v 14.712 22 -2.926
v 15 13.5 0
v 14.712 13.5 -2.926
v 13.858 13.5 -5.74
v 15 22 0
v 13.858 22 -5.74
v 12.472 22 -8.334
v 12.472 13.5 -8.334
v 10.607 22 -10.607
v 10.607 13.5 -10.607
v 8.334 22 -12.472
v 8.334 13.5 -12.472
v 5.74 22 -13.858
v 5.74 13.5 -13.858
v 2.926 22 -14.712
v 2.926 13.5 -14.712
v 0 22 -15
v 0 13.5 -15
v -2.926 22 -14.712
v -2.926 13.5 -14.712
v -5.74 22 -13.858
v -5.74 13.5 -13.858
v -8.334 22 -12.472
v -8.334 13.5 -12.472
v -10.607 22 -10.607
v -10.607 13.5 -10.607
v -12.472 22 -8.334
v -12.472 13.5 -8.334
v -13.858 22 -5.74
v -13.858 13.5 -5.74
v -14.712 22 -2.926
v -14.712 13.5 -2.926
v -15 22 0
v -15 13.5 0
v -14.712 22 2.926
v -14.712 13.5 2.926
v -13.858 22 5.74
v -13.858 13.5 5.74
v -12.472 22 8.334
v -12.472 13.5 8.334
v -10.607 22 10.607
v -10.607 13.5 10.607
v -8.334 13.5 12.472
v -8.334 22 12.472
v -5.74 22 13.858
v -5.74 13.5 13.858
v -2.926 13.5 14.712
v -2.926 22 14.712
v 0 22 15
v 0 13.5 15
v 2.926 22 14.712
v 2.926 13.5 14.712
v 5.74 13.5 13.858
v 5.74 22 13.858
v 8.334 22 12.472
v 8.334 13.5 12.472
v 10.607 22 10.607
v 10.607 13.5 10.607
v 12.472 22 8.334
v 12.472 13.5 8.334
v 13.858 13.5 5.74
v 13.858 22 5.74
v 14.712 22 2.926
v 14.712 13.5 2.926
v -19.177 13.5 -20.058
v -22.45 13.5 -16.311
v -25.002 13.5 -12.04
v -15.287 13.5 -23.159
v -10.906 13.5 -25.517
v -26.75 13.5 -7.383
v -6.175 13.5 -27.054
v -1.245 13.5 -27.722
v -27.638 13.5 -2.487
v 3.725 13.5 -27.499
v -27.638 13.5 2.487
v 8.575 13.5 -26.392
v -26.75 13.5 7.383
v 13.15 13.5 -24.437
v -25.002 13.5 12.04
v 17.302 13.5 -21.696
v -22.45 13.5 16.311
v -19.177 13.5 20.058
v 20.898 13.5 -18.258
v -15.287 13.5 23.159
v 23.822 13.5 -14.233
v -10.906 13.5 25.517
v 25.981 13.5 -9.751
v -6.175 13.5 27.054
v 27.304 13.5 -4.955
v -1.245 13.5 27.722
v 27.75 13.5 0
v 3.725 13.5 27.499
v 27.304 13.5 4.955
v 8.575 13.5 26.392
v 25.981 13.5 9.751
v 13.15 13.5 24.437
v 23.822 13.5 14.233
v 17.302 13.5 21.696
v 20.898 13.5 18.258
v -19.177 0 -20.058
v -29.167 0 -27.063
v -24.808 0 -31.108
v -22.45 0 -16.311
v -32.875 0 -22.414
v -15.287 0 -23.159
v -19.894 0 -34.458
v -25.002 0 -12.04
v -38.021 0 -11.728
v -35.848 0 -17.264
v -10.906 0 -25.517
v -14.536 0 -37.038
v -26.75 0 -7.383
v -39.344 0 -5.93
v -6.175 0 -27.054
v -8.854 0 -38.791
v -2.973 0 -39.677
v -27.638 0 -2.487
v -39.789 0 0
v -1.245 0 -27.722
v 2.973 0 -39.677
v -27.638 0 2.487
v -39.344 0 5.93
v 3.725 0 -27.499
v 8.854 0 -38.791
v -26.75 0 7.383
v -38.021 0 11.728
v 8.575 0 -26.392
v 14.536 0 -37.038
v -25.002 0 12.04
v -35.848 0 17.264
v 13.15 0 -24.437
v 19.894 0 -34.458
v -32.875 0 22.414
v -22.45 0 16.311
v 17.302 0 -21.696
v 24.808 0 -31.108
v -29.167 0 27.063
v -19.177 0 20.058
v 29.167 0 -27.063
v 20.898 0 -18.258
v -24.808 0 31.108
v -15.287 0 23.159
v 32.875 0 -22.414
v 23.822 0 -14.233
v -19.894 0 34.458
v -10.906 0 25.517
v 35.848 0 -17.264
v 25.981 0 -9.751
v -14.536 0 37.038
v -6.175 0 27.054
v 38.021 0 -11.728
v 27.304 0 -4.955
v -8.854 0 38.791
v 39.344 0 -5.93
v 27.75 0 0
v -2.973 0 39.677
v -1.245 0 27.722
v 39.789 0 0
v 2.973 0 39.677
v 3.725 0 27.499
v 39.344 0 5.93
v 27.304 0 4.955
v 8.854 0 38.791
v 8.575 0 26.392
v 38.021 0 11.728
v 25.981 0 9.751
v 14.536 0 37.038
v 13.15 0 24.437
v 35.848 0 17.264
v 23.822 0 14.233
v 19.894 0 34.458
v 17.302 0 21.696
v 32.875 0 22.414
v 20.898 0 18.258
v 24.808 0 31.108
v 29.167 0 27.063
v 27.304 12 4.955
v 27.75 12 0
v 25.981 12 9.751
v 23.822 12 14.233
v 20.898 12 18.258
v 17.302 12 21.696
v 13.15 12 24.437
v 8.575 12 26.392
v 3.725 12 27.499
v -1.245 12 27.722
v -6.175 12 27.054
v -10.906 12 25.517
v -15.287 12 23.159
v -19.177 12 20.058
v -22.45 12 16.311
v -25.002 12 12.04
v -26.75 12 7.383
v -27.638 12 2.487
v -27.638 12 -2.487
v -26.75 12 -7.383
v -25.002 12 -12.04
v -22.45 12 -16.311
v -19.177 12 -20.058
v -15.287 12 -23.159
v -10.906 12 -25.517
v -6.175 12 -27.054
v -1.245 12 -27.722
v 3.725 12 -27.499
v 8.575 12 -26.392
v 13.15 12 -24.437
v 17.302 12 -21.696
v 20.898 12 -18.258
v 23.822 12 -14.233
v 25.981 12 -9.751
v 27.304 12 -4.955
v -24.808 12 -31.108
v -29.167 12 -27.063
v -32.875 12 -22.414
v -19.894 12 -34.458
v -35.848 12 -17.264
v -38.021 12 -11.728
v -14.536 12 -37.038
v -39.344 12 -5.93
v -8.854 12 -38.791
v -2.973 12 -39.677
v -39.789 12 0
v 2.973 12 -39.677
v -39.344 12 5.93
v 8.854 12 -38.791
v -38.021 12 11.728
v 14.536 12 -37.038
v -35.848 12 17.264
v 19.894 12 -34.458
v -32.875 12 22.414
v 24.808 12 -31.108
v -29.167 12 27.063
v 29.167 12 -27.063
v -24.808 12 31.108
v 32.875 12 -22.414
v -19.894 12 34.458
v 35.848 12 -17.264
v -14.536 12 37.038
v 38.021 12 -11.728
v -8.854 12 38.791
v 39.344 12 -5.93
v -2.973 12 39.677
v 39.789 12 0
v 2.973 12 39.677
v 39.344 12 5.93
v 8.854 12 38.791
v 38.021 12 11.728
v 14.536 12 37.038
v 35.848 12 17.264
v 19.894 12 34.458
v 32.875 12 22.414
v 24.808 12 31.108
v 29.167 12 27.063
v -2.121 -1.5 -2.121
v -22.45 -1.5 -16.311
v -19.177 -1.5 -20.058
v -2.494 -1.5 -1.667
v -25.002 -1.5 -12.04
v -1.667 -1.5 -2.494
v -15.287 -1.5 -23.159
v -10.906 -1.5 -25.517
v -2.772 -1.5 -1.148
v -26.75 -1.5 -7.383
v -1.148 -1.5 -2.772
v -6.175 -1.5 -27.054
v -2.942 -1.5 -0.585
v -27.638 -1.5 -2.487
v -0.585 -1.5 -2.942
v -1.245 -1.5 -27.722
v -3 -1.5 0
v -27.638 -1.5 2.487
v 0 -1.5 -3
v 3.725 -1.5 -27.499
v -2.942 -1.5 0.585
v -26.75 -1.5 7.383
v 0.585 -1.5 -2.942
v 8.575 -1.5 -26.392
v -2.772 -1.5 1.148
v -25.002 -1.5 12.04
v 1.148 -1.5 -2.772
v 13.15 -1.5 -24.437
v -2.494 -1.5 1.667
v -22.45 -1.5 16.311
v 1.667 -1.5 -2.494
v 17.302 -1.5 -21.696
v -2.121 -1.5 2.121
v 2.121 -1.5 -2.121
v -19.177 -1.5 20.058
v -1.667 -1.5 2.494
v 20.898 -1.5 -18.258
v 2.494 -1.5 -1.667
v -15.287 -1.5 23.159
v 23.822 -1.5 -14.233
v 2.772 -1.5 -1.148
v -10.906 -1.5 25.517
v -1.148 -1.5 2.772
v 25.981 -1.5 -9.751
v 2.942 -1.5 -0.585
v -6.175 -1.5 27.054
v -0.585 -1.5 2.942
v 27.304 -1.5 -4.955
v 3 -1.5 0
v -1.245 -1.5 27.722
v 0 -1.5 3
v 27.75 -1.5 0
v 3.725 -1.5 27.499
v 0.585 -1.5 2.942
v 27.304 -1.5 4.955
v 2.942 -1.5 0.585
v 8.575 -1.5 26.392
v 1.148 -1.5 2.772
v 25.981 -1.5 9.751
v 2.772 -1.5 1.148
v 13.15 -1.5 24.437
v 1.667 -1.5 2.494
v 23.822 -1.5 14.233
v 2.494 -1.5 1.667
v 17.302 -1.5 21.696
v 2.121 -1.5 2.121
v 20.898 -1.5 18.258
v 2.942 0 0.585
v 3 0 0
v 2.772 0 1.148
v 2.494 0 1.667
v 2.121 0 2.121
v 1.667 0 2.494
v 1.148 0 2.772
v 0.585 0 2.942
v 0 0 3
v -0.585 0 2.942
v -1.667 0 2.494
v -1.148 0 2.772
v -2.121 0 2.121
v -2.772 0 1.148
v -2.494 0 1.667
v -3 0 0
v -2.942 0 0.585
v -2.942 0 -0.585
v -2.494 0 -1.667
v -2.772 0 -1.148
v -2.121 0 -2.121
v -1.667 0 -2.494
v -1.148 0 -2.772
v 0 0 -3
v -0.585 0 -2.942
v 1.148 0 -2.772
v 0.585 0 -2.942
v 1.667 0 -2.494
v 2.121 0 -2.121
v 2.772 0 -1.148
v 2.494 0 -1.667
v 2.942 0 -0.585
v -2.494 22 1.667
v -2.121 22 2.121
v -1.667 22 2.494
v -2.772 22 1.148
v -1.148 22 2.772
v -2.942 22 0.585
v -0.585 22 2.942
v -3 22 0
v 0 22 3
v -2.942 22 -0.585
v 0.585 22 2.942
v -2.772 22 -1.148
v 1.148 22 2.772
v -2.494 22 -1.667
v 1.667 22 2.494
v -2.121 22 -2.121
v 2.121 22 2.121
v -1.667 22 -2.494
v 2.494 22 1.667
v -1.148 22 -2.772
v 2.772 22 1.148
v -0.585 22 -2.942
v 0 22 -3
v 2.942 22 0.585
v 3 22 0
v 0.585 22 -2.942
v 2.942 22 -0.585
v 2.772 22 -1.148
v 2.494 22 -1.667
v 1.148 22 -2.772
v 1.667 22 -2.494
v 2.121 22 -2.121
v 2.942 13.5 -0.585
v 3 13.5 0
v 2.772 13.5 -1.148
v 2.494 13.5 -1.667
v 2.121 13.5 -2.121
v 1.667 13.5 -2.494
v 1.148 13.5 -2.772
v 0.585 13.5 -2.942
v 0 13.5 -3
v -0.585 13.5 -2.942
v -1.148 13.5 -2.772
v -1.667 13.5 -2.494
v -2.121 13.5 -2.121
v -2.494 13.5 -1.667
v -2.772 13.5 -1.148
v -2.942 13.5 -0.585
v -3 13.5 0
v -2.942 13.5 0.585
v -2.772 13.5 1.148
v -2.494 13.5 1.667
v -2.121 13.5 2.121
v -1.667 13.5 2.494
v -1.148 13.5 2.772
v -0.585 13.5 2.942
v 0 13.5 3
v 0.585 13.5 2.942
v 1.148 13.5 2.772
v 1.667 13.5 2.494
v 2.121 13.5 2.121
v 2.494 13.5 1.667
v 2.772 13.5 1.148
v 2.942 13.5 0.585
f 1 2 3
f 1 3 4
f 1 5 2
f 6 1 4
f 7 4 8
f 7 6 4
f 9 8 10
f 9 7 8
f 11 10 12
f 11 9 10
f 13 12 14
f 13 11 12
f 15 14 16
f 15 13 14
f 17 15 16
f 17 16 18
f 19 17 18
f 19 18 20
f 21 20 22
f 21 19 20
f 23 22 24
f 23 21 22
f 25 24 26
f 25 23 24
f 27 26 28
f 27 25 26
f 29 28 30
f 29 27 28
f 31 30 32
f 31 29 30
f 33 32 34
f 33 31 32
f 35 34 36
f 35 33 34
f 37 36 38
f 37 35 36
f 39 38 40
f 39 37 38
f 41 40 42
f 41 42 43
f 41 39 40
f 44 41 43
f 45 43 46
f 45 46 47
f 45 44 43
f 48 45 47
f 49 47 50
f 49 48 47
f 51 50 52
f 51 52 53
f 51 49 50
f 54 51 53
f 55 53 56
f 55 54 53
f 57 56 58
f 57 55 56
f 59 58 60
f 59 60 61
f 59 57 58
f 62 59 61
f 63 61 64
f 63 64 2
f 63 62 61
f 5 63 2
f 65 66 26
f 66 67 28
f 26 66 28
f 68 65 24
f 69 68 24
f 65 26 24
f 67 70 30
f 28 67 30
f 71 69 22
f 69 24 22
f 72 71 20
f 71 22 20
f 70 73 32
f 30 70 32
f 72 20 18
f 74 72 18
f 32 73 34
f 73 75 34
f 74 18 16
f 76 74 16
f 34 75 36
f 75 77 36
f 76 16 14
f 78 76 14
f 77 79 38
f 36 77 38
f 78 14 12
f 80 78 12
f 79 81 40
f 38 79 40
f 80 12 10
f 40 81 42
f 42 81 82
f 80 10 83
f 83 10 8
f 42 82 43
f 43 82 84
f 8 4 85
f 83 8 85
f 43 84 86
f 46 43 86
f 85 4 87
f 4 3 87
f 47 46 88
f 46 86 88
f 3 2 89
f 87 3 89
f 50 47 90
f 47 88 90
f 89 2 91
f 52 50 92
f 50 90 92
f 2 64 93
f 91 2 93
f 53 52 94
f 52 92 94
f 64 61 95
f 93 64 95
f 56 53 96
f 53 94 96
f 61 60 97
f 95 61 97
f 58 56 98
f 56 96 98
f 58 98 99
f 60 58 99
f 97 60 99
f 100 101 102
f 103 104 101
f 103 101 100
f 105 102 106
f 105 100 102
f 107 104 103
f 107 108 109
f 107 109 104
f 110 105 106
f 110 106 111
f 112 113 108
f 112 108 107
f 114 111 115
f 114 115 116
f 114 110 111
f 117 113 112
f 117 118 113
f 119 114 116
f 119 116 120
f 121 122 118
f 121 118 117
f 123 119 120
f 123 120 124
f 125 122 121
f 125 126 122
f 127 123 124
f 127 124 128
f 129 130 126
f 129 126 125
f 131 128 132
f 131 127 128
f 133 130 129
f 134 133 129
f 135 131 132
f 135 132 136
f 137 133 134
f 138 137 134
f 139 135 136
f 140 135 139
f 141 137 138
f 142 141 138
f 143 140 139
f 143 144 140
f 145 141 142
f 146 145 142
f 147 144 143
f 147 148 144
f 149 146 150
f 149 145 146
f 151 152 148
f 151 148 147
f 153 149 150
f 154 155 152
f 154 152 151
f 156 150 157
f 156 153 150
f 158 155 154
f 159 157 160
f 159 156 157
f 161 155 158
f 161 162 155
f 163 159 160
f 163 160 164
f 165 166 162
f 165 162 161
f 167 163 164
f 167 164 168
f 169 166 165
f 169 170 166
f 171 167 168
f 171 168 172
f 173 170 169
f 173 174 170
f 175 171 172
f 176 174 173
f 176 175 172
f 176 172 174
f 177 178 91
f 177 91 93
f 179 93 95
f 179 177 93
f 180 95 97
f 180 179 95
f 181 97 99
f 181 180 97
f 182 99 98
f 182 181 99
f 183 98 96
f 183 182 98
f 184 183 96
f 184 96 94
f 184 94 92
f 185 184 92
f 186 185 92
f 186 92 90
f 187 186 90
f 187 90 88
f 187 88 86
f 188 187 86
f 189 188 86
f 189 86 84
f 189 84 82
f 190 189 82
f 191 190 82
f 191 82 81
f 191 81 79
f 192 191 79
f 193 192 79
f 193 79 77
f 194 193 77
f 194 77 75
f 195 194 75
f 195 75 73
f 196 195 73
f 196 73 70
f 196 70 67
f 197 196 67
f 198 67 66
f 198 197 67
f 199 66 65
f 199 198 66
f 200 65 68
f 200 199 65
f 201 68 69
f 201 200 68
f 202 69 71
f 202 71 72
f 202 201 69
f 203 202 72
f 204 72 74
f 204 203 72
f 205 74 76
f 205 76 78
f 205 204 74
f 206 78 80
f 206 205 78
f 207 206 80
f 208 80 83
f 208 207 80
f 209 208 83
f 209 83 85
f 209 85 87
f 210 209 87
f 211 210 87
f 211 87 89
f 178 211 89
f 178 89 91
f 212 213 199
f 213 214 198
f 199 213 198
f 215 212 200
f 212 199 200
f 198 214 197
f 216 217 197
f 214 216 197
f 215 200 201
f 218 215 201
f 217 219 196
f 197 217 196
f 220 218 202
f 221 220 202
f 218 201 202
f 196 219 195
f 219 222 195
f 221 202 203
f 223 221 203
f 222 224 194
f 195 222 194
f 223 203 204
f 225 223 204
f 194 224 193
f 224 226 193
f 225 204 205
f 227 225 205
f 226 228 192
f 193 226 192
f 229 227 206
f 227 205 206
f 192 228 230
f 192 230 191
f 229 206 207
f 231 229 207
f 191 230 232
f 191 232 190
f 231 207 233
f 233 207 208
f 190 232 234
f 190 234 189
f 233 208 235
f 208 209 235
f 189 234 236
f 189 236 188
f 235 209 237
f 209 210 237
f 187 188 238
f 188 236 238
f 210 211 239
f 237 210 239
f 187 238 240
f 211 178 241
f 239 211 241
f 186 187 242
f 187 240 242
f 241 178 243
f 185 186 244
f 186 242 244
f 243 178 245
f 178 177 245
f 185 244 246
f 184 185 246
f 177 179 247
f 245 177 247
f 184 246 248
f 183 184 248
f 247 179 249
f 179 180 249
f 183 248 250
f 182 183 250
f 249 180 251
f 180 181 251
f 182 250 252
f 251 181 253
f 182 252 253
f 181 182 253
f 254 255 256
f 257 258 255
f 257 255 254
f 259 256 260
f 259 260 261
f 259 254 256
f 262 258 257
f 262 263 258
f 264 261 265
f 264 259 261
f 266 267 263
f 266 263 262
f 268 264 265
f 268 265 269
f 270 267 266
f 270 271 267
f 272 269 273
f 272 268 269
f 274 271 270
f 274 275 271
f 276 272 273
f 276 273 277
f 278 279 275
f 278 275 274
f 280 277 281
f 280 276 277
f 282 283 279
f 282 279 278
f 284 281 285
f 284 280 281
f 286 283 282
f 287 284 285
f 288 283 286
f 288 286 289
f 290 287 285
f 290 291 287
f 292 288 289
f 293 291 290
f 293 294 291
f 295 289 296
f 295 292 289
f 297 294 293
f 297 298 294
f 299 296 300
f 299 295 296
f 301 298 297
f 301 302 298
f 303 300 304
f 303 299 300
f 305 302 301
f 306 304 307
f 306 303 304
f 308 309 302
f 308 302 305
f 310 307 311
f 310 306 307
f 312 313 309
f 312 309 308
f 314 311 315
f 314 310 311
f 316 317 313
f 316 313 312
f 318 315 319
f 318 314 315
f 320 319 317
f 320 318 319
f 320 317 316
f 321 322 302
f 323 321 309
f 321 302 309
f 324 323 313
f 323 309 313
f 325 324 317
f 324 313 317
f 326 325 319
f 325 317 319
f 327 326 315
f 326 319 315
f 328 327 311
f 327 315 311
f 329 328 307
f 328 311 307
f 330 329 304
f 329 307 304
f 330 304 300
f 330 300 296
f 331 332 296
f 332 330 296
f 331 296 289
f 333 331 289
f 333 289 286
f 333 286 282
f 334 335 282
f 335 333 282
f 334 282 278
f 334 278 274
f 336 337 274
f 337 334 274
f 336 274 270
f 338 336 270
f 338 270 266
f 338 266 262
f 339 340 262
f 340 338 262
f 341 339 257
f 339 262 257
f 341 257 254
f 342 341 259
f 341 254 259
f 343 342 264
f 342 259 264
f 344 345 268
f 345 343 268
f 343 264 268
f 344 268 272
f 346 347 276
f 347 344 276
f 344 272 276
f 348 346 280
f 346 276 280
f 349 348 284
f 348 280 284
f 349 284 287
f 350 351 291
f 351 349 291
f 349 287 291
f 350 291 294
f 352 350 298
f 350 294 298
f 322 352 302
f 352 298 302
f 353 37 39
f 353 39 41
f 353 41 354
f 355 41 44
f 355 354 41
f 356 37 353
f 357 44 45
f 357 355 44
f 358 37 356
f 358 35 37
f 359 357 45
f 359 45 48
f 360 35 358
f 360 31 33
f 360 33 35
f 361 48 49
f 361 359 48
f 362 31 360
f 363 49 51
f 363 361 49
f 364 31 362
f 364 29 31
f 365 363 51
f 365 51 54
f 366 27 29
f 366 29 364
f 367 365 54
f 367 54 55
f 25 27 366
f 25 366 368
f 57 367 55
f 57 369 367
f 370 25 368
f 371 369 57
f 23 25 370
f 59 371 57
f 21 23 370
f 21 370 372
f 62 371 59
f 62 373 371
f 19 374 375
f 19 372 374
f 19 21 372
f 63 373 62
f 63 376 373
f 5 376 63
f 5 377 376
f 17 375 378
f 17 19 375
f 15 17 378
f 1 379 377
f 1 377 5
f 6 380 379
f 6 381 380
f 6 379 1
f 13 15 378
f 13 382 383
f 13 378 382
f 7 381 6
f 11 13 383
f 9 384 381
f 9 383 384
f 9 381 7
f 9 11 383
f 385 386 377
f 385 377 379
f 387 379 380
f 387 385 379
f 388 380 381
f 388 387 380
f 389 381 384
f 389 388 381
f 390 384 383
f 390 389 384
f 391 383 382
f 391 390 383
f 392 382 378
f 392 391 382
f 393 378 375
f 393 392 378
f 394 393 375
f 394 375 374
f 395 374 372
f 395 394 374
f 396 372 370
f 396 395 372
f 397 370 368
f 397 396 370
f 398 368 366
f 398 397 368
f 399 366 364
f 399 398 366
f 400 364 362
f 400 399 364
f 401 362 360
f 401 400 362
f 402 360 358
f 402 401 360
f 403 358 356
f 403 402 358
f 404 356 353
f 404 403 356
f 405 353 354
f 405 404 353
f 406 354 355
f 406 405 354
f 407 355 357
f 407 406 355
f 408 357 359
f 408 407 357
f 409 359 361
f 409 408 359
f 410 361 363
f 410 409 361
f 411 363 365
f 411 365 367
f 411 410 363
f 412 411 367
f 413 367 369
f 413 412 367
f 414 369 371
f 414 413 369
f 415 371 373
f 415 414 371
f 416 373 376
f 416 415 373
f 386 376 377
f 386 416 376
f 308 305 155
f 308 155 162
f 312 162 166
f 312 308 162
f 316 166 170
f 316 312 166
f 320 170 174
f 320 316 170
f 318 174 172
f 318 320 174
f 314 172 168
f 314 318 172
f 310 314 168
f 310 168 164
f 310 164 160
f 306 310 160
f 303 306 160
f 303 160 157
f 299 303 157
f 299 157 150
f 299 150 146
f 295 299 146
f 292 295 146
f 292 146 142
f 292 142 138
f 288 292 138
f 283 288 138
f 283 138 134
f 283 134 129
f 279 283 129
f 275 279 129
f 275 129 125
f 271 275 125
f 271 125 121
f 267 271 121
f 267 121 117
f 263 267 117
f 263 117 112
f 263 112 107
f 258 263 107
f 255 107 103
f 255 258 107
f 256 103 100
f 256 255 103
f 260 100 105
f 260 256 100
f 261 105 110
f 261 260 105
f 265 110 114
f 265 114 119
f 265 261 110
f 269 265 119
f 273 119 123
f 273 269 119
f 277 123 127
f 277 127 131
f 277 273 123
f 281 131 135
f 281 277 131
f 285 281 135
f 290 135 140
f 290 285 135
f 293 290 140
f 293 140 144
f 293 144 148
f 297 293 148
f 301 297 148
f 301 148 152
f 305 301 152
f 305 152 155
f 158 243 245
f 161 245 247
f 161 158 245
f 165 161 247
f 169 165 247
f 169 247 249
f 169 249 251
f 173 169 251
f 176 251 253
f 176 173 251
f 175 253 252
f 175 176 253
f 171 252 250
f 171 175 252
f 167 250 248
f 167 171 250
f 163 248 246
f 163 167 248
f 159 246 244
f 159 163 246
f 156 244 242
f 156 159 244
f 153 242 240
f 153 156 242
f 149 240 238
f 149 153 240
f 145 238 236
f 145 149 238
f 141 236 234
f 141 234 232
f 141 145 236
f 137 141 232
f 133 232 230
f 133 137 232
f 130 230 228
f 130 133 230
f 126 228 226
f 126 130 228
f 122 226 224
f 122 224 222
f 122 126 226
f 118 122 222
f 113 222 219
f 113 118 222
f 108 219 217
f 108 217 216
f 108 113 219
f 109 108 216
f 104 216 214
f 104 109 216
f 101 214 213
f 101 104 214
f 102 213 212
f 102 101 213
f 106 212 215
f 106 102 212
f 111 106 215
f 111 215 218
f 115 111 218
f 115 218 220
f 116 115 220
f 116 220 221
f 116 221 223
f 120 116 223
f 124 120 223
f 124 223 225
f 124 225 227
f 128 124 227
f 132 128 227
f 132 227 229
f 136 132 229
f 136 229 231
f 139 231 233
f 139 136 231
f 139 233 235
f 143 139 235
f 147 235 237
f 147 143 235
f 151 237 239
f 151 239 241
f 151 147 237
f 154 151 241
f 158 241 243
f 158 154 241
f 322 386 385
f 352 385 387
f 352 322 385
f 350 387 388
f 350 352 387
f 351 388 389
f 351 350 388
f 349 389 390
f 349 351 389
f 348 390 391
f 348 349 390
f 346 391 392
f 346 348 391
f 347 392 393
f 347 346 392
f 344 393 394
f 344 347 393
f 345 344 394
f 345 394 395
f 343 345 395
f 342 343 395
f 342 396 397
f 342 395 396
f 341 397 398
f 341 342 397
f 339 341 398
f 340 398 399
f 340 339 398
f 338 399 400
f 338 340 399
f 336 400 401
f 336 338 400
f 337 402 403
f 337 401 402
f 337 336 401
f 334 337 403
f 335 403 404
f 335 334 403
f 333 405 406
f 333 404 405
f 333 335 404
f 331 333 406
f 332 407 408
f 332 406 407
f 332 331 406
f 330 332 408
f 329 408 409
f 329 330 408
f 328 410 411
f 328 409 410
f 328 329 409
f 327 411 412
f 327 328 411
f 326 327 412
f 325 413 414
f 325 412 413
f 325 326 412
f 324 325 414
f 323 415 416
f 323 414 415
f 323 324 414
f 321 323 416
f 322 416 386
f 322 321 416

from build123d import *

# Parameters (mm, degrees)
SKETCH2_R           = 39.788735773
SKETCH2_R_2         = 27.75
BOSS_EXTRUDE1_DEPTH = 12
BOSS_EXTRUDE2_START = 1.5
SKETCH3_R           = 27.75
SKETCH3_R_2         = 3
BOSS_EXTRUDE2_DEPTH = 15


with BuildPart() as part:
    # Sketch1 → Revolve1 (revolve)
    with BuildSketch(Plane.XY):
        Polygon((3, 22), (3, 0), (27.75, 0), (27.75, 12), (15, 12), (15, 22), align=None)
    revolve(axis=Axis((0, 0, 0), (0, 1, 0)))



with BuildPart() as body_2:
    # Sketch2 → Boss-Extrude1 (new body)
    with BuildSketch(Plane.XZ):
        Circle(SKETCH2_R)
        Circle(SKETCH2_R_2, mode=Mode.SUBTRACT)
    extrude(amount=-BOSS_EXTRUDE1_DEPTH)


with BuildPart() as part_1:
    add(part.part)

    add(body_2.part)  # Boss-Extrude2 merges body 2
    # Sketch3 → Boss-Extrude2 (add)
    with BuildSketch(Plane.XZ.offset(BOSS_EXTRUDE2_START)):
        Circle(SKETCH3_R)
        Circle(SKETCH3_R_2, mode=Mode.SUBTRACT)
    extrude(amount=-BOSS_EXTRUDE2_DEPTH)


solid = part_1.part
